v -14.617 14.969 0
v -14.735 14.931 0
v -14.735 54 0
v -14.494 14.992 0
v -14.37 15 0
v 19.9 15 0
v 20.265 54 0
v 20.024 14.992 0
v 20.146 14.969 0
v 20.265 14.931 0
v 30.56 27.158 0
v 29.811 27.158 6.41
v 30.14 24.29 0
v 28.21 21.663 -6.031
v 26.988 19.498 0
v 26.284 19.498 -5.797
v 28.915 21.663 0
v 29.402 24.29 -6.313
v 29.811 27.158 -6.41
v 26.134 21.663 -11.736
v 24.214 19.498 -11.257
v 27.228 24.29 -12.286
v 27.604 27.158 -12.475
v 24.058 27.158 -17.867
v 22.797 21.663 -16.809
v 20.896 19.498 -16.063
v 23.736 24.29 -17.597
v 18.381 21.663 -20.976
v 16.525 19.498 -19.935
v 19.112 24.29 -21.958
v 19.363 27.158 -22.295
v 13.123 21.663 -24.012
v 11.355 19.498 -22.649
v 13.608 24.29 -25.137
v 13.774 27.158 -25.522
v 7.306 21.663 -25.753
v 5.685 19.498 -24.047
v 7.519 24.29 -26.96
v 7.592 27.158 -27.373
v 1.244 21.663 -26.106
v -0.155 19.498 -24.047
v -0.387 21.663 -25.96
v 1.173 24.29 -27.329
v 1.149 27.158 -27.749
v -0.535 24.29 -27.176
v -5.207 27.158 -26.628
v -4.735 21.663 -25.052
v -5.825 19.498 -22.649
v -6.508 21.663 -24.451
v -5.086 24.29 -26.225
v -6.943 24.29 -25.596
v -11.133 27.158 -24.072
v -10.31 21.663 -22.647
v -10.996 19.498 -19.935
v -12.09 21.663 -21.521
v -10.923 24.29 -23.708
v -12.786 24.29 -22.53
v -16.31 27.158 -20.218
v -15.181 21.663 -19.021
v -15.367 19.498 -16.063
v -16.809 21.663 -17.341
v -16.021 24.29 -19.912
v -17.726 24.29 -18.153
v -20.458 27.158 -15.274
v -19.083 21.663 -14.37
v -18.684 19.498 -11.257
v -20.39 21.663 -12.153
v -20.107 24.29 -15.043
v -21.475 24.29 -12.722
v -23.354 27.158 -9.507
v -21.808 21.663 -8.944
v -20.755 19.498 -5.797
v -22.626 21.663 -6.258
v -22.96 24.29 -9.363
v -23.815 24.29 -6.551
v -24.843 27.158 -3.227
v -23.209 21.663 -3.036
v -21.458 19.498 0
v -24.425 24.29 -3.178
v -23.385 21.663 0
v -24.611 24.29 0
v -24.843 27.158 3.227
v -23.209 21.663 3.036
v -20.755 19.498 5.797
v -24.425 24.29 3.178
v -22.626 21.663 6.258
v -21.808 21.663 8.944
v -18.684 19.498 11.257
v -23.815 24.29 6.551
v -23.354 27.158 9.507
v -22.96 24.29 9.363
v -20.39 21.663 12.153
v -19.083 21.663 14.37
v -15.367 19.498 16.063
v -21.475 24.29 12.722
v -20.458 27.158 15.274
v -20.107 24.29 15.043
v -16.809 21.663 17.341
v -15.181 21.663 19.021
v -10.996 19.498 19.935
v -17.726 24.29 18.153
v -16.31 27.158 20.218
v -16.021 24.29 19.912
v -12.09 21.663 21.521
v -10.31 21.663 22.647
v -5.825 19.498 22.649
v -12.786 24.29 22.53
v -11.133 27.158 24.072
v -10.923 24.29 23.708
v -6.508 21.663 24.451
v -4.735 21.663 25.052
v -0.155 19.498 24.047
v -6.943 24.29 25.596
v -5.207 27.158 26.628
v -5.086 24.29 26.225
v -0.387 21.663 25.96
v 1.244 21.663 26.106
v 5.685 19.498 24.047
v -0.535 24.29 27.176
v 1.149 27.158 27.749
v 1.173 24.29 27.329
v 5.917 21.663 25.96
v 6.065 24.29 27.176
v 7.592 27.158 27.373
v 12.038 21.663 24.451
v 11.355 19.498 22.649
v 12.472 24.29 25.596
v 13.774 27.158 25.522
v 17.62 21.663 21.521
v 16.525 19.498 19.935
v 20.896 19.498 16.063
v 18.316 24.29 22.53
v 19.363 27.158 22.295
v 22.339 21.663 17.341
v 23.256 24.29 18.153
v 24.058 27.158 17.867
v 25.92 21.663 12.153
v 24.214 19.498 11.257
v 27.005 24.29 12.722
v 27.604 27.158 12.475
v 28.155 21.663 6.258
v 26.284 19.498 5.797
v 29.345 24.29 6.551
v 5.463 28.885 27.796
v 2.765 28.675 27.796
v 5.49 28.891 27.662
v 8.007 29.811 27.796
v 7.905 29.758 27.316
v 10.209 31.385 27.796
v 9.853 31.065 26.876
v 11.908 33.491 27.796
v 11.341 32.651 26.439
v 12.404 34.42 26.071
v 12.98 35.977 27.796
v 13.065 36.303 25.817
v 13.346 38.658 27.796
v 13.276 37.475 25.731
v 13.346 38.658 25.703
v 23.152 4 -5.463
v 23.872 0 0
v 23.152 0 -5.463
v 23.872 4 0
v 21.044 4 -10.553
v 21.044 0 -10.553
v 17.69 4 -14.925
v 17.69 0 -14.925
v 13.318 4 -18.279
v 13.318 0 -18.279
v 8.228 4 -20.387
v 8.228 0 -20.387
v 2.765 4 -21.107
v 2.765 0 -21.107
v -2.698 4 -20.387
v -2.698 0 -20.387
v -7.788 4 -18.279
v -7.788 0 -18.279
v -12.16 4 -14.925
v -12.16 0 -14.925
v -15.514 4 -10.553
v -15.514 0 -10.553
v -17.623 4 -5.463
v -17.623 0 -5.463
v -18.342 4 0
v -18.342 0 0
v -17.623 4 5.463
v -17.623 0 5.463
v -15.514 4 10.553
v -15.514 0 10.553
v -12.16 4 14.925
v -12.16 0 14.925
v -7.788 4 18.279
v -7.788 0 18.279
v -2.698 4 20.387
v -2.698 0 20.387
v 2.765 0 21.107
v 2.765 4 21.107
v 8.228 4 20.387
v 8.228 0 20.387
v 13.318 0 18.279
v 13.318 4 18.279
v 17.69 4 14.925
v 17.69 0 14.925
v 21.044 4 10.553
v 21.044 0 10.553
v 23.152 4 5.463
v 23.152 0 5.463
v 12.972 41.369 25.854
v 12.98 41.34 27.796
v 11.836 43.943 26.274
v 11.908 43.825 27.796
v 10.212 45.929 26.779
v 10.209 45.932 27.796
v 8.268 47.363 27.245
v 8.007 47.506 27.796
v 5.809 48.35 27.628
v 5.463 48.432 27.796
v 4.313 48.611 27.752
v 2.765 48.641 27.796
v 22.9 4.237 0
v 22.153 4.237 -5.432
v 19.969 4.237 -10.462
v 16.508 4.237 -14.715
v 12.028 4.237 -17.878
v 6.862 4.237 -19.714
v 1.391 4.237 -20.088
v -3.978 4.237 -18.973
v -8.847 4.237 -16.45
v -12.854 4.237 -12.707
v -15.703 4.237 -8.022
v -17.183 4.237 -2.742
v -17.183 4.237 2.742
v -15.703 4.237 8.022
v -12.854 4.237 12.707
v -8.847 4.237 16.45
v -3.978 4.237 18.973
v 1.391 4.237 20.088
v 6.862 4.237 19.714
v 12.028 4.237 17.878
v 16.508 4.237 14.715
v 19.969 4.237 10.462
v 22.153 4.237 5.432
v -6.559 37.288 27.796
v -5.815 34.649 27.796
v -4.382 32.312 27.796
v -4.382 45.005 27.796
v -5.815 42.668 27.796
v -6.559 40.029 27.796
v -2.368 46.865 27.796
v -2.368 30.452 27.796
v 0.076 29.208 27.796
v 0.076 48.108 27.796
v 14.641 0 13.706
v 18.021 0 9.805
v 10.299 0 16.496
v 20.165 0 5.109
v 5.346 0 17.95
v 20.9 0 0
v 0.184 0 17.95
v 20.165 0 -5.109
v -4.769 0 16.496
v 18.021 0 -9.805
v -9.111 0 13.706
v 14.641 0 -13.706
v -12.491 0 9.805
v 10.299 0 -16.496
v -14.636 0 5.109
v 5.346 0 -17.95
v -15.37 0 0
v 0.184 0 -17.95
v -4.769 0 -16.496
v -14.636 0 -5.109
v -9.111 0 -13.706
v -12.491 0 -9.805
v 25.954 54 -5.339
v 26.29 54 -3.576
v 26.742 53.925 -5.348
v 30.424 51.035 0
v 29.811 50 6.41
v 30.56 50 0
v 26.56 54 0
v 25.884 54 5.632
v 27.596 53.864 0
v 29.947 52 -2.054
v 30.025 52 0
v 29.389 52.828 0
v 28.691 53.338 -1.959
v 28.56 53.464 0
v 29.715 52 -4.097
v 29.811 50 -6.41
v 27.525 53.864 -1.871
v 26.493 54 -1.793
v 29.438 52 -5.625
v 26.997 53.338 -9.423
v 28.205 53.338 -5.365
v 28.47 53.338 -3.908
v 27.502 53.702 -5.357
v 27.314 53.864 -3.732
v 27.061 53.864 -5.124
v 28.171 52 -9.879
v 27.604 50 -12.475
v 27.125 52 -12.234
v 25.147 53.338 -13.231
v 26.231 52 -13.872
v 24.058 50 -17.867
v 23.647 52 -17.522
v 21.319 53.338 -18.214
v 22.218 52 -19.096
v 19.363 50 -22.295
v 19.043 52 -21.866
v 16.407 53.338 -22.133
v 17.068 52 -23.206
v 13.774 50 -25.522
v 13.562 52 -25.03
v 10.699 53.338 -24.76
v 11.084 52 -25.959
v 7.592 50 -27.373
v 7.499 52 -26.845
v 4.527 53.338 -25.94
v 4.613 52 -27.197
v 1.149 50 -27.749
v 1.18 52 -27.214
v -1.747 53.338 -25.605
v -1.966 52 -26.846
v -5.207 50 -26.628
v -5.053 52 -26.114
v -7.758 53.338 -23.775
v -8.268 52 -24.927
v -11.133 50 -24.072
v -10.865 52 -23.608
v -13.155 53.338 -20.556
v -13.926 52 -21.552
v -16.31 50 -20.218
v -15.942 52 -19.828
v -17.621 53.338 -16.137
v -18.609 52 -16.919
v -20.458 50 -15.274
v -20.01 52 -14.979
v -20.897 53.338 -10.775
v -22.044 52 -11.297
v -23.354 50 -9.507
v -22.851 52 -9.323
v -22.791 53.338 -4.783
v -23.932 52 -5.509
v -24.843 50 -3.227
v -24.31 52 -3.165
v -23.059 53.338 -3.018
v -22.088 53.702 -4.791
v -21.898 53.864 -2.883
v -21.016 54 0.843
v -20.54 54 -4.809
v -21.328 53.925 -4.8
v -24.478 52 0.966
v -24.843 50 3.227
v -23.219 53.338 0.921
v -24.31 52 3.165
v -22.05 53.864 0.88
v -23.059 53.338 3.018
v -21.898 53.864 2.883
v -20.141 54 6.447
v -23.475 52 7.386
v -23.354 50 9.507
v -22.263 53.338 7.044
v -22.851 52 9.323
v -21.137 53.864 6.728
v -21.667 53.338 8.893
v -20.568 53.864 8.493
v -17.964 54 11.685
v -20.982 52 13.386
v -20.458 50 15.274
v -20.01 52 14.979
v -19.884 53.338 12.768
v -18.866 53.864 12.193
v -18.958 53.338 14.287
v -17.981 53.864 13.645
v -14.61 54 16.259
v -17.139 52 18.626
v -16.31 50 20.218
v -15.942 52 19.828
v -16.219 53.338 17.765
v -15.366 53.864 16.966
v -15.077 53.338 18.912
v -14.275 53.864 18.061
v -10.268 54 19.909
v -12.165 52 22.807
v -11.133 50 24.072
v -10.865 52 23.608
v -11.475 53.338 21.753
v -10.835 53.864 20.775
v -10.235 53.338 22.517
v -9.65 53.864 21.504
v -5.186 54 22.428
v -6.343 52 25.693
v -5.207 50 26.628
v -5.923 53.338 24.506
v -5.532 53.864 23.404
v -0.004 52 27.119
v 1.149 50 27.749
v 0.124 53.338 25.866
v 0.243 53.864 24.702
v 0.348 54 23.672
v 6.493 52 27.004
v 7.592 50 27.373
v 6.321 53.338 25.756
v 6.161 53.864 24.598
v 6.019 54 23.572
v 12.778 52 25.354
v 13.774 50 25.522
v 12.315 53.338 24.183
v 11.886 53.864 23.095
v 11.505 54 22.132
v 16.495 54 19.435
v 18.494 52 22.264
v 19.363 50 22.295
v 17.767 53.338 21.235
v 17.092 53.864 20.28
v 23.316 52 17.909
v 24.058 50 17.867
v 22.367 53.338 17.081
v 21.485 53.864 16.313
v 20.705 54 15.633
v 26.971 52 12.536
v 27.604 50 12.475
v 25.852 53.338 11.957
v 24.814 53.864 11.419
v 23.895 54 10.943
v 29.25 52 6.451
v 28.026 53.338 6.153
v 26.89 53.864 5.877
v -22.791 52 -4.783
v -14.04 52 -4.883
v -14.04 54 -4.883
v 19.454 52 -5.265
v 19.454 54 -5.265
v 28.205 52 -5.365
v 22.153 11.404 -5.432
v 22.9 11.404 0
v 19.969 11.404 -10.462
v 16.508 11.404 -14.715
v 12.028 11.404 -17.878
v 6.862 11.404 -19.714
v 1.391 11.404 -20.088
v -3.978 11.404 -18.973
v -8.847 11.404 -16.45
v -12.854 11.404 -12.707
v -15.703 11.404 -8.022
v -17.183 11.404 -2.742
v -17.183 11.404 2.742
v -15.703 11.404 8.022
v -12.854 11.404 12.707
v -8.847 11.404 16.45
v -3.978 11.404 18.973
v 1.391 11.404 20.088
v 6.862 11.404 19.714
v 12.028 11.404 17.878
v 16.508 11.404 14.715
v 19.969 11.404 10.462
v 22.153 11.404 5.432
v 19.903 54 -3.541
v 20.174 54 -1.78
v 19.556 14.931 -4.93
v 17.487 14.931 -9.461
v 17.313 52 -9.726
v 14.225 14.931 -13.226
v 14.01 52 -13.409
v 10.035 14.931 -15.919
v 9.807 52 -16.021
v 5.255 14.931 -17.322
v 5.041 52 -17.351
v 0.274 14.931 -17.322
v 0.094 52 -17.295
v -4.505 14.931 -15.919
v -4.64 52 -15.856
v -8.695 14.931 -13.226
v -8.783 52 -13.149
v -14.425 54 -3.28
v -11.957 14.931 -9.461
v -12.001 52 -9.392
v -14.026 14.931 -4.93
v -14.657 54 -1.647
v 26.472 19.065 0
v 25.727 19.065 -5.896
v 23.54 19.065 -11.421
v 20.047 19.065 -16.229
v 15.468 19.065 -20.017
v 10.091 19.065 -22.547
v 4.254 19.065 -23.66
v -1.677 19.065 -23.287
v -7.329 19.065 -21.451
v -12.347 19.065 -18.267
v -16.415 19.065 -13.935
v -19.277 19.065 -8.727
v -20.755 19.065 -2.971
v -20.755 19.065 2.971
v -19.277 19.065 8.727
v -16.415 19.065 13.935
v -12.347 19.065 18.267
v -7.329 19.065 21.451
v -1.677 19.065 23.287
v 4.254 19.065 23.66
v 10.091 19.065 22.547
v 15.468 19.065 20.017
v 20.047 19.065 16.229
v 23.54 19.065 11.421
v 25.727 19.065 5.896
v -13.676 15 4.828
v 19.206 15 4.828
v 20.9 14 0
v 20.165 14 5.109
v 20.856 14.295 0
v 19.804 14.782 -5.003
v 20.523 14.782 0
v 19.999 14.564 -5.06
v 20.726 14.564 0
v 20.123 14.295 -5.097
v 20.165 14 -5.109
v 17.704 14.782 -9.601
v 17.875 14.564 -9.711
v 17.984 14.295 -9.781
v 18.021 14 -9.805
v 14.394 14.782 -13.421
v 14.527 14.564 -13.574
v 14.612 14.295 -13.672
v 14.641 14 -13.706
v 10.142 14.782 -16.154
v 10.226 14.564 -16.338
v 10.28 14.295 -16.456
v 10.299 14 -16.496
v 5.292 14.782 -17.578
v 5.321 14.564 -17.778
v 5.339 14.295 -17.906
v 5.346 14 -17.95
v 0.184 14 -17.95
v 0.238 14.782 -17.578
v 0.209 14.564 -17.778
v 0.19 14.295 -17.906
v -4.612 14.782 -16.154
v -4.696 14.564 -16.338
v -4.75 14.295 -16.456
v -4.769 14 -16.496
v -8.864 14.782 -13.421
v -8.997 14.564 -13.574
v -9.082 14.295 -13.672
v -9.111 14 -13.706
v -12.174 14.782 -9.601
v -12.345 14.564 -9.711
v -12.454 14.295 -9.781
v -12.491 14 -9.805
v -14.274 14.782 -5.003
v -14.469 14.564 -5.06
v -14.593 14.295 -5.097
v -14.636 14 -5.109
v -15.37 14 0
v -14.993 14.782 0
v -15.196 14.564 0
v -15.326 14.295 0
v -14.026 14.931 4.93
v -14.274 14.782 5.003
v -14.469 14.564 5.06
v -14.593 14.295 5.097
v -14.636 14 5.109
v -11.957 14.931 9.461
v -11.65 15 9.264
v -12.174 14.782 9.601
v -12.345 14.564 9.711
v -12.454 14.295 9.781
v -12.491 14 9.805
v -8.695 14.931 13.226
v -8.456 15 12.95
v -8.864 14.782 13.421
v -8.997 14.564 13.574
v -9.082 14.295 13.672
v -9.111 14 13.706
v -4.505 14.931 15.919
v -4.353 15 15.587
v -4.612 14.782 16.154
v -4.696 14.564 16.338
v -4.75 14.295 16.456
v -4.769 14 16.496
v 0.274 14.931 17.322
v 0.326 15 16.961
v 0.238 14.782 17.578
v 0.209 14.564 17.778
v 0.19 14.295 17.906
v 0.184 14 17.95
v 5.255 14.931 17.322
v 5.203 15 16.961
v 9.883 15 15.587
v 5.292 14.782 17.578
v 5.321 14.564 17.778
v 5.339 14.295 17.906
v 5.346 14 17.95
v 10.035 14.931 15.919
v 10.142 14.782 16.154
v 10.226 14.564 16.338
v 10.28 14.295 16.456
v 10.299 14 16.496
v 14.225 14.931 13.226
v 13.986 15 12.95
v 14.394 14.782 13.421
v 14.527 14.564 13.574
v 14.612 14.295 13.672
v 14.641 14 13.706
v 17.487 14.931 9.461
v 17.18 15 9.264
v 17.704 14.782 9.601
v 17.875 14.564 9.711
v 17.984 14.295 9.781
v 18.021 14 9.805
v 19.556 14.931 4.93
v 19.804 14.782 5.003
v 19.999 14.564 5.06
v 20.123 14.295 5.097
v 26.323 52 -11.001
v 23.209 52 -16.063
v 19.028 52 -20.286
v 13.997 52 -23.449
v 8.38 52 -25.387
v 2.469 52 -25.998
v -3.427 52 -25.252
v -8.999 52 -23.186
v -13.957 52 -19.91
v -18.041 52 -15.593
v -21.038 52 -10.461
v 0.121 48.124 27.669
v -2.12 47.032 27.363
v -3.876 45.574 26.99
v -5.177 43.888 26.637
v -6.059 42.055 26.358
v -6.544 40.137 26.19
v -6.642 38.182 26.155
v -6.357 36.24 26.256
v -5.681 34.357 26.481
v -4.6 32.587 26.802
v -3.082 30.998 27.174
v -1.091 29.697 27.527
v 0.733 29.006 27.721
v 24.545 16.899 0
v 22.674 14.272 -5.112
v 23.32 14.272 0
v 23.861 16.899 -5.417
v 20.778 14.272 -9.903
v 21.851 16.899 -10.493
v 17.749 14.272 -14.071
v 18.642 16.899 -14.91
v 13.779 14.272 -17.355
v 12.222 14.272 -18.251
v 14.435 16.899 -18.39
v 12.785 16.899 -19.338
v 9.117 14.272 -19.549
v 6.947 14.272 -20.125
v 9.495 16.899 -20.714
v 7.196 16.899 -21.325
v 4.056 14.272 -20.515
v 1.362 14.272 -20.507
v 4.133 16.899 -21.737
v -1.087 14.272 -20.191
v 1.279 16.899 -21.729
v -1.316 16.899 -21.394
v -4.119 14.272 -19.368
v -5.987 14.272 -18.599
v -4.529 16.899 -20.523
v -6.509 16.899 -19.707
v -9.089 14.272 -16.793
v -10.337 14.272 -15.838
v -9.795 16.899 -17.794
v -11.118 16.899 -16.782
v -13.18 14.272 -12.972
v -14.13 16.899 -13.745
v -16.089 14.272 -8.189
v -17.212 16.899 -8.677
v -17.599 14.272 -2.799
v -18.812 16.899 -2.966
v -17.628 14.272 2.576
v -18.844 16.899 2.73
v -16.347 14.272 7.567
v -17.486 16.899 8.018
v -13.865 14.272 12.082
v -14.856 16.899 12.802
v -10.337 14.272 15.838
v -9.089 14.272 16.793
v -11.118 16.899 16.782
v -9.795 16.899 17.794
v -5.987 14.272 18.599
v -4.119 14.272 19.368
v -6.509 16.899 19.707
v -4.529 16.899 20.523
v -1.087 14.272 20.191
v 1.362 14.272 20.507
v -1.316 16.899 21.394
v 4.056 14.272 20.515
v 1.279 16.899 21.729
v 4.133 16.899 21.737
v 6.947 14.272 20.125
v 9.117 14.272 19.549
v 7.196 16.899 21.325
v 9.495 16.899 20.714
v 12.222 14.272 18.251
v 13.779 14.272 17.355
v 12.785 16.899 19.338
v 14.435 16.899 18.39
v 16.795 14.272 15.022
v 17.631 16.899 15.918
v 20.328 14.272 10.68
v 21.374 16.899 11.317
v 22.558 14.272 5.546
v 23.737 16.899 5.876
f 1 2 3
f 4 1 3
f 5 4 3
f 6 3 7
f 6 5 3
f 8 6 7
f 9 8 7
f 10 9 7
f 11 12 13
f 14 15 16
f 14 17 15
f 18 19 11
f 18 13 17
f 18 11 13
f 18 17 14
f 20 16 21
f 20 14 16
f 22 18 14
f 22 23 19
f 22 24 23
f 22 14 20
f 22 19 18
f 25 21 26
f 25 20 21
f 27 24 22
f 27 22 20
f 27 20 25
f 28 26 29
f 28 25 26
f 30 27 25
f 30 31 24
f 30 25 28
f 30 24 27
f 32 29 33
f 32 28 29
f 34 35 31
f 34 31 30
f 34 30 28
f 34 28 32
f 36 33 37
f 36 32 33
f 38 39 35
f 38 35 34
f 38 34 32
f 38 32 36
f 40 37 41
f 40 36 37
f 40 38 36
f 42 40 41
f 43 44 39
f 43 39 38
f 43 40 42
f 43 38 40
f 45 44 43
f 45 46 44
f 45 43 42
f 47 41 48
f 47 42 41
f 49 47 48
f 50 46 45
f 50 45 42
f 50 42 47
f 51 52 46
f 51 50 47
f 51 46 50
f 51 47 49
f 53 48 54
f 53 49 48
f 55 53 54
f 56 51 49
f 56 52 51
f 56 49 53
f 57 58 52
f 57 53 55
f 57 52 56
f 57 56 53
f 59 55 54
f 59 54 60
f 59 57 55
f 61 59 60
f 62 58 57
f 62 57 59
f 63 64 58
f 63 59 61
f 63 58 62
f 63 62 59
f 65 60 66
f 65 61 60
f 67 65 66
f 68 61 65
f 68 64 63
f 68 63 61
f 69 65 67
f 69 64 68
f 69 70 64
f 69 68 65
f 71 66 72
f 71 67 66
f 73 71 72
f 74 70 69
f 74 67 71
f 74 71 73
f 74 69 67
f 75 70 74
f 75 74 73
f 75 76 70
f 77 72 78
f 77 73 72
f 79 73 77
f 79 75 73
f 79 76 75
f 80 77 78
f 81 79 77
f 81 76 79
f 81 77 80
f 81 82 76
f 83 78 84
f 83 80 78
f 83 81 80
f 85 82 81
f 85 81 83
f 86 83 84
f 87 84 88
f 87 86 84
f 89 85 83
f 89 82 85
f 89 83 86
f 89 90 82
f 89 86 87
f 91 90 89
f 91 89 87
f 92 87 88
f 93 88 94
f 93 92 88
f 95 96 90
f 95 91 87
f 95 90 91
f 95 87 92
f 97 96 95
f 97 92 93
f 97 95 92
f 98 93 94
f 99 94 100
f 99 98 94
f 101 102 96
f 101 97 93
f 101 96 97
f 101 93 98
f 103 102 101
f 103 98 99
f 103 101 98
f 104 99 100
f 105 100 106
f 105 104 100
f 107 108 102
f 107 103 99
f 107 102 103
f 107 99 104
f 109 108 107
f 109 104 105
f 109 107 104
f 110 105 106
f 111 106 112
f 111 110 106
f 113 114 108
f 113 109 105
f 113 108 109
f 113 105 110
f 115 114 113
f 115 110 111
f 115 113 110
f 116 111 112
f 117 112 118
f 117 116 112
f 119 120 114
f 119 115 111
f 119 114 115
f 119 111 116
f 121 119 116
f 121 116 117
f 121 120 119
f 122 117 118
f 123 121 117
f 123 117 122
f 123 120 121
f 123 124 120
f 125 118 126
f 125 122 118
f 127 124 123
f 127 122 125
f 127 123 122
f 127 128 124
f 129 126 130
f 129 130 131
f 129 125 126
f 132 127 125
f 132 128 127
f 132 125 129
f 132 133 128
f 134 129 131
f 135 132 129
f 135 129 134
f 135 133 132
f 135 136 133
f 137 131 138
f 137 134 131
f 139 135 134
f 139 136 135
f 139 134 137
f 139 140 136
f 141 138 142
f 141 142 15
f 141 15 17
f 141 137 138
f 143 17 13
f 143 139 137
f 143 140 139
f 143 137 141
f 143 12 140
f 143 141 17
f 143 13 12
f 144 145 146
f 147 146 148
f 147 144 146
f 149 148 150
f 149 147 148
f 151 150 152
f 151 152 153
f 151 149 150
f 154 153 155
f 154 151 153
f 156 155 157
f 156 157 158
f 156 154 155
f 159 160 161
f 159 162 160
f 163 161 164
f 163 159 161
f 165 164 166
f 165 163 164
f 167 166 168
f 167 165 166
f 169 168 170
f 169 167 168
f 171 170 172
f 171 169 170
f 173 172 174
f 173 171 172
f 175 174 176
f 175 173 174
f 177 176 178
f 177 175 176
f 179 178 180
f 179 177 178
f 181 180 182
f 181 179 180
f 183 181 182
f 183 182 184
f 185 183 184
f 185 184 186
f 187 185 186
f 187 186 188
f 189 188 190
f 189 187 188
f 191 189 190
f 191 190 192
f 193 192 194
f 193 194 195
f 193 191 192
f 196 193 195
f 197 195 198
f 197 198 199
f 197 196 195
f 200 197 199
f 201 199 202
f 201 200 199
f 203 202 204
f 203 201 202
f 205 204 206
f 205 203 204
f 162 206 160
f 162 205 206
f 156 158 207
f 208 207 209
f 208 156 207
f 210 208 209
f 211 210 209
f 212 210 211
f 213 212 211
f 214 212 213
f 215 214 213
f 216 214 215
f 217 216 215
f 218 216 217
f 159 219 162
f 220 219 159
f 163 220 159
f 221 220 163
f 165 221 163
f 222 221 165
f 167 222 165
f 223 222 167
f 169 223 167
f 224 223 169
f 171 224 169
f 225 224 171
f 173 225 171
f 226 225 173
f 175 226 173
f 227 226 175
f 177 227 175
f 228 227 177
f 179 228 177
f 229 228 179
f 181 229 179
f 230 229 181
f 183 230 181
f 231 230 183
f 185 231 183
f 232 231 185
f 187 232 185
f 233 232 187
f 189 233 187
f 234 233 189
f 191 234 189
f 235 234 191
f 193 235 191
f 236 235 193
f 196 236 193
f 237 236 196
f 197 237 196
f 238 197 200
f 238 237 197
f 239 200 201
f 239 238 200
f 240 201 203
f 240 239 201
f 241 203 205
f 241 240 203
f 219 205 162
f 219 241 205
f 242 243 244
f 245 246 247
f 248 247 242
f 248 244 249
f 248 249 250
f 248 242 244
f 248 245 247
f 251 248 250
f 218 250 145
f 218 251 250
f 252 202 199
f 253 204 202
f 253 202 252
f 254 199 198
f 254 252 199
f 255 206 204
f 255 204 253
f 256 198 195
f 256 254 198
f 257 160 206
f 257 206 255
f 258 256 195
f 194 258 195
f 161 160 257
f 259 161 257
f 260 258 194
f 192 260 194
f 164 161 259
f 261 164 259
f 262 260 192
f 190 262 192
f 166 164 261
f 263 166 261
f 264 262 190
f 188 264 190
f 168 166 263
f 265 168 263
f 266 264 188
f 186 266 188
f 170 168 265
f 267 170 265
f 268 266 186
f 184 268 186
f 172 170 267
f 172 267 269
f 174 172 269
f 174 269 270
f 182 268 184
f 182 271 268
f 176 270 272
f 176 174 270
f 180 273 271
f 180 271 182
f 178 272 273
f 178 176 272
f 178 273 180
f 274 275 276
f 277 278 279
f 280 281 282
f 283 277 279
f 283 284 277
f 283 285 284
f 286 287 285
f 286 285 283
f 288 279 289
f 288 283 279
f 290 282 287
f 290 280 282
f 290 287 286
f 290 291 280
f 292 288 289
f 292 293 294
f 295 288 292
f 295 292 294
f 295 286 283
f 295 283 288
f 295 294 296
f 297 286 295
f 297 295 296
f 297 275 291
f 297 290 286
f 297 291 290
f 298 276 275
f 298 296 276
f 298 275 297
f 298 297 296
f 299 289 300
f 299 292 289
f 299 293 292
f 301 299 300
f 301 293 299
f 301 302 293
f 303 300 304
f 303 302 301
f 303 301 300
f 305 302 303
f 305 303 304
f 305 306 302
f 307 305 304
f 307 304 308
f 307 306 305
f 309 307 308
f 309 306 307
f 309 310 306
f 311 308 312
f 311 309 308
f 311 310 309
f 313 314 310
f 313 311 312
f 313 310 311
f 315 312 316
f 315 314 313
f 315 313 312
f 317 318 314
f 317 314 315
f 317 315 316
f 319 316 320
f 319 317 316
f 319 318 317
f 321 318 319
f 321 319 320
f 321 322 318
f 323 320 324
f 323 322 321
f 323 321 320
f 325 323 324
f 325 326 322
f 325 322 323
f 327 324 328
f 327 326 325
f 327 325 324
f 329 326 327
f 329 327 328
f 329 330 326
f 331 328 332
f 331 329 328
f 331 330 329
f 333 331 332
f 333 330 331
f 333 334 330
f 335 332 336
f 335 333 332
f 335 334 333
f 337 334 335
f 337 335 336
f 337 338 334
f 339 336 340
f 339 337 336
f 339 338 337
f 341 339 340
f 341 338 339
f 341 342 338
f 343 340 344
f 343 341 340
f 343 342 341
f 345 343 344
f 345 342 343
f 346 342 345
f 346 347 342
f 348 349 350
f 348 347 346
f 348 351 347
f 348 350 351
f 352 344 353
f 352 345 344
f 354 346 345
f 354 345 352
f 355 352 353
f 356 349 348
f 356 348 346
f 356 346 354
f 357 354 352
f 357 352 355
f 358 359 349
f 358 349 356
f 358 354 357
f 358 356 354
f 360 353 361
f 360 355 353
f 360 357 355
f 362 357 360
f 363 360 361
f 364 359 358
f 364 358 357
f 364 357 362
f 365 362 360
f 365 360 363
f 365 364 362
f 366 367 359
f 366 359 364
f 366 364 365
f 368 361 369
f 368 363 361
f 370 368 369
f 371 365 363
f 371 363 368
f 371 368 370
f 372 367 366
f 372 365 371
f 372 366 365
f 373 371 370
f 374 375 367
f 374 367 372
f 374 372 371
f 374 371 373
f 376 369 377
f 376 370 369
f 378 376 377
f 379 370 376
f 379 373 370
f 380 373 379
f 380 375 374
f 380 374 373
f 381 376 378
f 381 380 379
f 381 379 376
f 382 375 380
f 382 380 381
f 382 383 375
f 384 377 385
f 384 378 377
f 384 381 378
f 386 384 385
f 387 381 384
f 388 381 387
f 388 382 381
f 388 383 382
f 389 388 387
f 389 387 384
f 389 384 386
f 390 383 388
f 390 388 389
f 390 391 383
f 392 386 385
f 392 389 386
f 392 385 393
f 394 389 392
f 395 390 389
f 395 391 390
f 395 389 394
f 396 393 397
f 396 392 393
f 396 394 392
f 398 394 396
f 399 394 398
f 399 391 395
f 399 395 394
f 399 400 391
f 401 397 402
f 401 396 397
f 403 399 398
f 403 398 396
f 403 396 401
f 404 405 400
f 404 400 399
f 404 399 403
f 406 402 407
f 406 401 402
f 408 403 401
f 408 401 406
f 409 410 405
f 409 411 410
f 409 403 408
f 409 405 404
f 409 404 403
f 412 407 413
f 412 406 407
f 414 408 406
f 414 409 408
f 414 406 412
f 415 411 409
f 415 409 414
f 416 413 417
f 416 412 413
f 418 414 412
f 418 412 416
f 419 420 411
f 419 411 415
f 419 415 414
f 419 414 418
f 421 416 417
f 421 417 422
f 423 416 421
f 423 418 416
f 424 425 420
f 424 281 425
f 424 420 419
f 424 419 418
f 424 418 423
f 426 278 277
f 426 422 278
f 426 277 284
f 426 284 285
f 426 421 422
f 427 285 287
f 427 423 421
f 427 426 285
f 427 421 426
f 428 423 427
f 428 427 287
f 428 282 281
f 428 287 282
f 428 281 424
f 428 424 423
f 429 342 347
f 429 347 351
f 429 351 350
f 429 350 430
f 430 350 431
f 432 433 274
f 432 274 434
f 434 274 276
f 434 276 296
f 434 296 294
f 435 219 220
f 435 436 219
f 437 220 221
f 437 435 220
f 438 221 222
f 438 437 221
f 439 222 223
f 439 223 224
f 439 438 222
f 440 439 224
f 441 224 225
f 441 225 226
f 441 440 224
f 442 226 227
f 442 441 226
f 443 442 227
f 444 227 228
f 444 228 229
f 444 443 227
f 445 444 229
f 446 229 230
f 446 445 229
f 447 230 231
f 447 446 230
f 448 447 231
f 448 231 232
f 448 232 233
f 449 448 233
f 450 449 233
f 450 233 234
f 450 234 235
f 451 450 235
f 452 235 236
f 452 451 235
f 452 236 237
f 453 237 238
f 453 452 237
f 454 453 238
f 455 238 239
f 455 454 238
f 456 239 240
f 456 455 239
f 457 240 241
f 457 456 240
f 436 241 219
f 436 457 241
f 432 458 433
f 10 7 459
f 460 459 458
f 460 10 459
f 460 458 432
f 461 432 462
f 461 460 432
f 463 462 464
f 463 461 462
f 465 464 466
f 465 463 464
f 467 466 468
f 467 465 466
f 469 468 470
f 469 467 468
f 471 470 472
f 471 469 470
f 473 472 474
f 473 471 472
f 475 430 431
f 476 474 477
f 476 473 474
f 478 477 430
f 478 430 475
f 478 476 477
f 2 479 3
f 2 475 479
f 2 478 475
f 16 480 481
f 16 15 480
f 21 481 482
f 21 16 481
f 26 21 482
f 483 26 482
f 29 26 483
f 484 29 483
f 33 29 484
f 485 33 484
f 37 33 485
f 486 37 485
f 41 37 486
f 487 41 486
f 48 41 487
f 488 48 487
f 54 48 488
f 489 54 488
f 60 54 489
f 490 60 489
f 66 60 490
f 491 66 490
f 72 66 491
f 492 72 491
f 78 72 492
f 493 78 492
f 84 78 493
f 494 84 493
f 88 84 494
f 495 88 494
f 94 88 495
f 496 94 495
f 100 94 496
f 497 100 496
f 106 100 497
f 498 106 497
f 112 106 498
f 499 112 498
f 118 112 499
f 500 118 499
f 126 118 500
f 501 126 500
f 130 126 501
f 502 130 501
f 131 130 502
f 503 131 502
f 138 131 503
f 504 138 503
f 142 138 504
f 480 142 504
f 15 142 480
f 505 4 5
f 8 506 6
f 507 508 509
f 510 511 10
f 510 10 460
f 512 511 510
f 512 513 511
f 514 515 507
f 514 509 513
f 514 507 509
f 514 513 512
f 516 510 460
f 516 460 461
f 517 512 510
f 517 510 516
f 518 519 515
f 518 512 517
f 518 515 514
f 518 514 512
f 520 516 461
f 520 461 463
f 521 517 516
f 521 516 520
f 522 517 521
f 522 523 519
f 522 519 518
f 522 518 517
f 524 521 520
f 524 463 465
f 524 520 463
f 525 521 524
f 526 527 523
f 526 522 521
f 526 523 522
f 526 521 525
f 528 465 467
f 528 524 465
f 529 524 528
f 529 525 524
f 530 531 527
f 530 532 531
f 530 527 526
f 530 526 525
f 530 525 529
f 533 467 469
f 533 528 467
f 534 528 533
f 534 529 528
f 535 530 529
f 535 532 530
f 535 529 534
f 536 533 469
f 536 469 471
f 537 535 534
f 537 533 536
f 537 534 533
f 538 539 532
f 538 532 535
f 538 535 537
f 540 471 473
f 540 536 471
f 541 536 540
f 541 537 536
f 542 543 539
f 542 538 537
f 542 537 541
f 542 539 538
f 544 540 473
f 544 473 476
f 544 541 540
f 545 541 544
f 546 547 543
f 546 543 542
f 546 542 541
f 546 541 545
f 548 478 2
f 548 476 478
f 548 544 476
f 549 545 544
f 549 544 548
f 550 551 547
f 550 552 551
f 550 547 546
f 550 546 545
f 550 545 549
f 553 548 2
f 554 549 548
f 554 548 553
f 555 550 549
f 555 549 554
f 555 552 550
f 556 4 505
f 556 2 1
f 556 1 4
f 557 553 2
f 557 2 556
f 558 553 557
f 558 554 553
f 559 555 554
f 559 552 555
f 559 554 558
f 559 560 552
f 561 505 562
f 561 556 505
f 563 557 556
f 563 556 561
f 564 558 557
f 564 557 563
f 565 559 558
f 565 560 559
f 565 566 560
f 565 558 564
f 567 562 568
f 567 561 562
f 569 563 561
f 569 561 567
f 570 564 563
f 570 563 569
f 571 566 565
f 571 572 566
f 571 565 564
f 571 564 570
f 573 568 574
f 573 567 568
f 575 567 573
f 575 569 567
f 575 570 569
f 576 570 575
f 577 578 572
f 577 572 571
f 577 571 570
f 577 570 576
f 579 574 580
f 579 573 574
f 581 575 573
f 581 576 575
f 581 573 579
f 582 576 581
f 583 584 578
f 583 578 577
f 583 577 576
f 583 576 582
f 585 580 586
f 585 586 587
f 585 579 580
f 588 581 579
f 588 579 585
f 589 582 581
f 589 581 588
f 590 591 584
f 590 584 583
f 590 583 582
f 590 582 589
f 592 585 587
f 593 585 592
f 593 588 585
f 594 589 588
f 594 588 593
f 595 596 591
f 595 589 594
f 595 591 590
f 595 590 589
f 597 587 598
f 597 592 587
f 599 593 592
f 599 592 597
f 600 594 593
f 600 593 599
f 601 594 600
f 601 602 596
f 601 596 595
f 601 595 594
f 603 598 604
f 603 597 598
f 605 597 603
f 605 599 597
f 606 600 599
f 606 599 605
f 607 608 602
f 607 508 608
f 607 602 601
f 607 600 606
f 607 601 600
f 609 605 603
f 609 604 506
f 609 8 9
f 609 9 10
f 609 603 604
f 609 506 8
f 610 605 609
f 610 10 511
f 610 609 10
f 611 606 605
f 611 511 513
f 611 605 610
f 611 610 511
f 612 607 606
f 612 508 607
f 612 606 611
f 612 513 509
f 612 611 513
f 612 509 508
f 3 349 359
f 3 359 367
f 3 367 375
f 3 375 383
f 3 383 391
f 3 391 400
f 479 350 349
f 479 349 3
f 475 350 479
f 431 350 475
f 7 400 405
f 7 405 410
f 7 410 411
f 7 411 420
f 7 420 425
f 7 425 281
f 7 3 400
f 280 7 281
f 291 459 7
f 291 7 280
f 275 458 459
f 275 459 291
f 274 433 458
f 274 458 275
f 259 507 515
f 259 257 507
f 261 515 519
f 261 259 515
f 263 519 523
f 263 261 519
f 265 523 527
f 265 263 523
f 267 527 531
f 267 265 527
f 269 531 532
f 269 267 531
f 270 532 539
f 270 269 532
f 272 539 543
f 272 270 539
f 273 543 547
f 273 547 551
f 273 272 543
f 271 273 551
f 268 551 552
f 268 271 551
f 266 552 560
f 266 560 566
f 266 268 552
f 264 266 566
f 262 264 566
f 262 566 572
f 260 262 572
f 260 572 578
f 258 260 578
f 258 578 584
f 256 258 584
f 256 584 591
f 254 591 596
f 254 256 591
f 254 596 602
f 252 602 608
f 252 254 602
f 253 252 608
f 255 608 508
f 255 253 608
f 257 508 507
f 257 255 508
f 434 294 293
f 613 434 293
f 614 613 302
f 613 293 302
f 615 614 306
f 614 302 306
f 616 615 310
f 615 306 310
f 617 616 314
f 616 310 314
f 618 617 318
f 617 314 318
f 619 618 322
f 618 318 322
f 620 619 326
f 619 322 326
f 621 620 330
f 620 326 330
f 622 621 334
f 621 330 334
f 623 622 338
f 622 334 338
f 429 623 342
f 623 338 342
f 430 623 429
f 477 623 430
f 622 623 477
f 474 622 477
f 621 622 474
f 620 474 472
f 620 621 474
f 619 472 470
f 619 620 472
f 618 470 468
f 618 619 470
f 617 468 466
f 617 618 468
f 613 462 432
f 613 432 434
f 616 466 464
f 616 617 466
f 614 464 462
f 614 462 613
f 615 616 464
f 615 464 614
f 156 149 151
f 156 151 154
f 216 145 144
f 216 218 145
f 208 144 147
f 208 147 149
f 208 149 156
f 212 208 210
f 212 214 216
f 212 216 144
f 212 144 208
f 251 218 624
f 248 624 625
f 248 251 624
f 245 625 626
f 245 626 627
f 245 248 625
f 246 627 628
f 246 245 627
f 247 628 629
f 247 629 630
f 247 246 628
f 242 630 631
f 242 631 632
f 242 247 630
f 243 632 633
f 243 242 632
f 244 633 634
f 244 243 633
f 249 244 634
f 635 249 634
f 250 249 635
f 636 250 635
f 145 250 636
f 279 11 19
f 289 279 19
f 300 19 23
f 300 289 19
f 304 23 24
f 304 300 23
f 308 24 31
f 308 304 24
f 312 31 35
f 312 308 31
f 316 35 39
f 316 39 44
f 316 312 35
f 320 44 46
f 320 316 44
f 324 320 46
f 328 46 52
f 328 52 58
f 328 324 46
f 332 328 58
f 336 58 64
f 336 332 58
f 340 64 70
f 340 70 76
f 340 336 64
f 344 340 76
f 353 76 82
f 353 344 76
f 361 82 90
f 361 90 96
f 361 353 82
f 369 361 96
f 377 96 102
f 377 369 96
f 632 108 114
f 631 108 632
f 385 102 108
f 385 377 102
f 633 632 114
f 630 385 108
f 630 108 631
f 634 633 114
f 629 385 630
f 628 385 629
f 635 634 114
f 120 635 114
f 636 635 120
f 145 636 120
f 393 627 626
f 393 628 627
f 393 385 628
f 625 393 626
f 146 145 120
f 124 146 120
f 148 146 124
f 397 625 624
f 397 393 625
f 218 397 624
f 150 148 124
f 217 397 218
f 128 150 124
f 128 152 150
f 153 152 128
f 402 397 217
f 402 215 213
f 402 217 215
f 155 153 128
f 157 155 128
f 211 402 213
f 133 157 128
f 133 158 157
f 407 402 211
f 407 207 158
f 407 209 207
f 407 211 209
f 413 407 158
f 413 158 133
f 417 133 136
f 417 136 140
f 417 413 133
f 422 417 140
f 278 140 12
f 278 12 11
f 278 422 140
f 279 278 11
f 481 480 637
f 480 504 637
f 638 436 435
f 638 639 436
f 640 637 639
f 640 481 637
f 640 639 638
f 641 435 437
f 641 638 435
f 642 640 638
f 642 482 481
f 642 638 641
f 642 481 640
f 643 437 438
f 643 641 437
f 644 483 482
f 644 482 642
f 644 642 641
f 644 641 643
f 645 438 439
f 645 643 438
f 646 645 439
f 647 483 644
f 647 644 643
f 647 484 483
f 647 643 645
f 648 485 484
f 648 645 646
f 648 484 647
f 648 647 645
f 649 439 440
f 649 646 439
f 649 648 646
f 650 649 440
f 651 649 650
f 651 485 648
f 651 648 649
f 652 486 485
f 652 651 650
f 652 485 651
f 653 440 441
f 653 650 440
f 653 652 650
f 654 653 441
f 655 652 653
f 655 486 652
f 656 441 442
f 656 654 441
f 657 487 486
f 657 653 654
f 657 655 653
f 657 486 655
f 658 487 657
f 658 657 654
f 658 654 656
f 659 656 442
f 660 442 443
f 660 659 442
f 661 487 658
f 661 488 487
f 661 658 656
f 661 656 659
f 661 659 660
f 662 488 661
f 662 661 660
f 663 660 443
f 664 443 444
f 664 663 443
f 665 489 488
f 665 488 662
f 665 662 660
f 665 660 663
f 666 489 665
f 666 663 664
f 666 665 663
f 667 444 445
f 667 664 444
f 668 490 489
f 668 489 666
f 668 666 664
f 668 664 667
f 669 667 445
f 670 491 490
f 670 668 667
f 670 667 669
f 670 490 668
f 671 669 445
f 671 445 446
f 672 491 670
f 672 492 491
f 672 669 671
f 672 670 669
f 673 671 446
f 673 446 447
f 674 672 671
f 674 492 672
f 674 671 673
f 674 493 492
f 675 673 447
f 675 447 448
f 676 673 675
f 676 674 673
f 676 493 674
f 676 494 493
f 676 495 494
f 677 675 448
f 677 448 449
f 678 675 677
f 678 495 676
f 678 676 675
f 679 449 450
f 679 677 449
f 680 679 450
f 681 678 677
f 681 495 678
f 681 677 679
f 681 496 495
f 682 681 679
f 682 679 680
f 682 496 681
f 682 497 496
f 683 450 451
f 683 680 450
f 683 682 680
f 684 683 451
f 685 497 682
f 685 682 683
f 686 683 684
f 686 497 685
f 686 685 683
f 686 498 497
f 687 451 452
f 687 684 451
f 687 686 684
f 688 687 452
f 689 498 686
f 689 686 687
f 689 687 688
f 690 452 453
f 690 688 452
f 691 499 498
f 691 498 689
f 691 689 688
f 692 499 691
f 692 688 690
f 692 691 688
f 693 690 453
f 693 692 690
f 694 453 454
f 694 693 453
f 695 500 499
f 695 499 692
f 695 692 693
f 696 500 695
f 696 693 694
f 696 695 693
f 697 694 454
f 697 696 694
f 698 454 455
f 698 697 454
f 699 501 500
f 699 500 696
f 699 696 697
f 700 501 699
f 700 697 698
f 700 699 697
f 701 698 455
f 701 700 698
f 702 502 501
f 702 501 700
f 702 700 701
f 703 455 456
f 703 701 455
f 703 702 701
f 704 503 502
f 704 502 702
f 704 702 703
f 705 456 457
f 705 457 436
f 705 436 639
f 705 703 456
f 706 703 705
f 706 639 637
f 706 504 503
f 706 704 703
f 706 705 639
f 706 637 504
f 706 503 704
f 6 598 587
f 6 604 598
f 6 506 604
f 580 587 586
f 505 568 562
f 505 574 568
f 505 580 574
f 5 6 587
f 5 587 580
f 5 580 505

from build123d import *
from build123d.topology import SkipClean

# Parameters (mm, degrees)
SKETCH10_R              = 10
BOSS_EXTRUDE1_DEPTH     = 5
CUT_EXTRUDE3_DEPTH      = 45
CUT_EXTRUDE3_DEPTH_BACK = 20
CUT_EXTRUDE5_DEPTH      = 2


with BuildPart() as part:
    # Sketch1 → Revolve1 (revolve)
    with BuildSketch(Plane.XY):
        with BuildLine():
            Line((20.9, 0), (23.871591838, 0))
            Line((23.871591838, 0), (23.871591838, 4))
            Line((23.871591838, 4), (22.9, 4.236662843))
            Line((22.9, 4.236662843), (22.9, 11.404308102))
            ThreePointArc((22.9, 11.404308102), (23.83692213, 15.63049072), (26.472123903, 19.064752533))
            Line((26.472123903, 19.064752533), (26.988320528, 19.497892931))
            ThreePointArc((26.988320528, 19.497892931), (29.623522302, 22.932154745), (30.560444431, 27.158337362))
            Line((30.560444431, 27.158337362), (30.560444431, 50))
            ThreePointArc((30.560444431, 50), (29.388871556, 52.828427125), (26.560444431, 54))
            Line((26.560444431, 54), (2.764914955, 54))
            Line((2.764914955, 54), (2.764914955, 15))
            Line((2.764914955, 15), (19.9, 15))
            ThreePointArc((19.9, 15), (20.607106781, 14.707106781), (20.9, 14))
            Line((20.9, 14), (20.9, 0))
        make_face()
    revolve(axis=Axis((2.764914955, 7.821821657, 0), (0, 1, 0)))

    # Sketch10 → Boss-Extrude1 (add)
    with SkipClean():  # the faces are left unmerged after this step: merging them gives an invalid solid
        with BuildSketch(Plane.XY.offset(27.795529476)):
            with Locations((3.346345887, 38.658337362)):
                Circle(SKETCH10_R)
        extrude(amount=-BOSS_EXTRUDE1_DEPTH)

    # Sketch11 → Cut-Extrude3 (cut, two sides: drawn at the far end of the back side and taken through both)
    with SkipClean():  # the faces are left unmerged after this step: merging them gives an invalid solid
        with BuildSketch(Plane(origin=(0, 17, 0), x_dir=(1, 0, 0), z_dir=(0, 1, 0)).offset(-CUT_EXTRUDE3_DEPTH_BACK)):
            with BuildLine():
                Line((-14.735085045, 0), (20.264914955, 0))
                ThreePointArc((20.264914955, 0), (2.764914955, 17.5), (-14.735085045, 0))
            make_face()
        extrude(amount=CUT_EXTRUDE3_DEPTH + CUT_EXTRUDE3_DEPTH_BACK, mode=Mode.SUBTRACT)

    # Sketch9 → Cut-Extrude5 (cut)
    with SkipClean():  # the faces are left unmerged after this step: merging them gives an invalid solid
        with BuildSketch(Plane(origin=(0, 54, 0), x_dir=(1, 0, 0), z_dir=(0, 1, 0))):
            with BuildLine():
                Line((-22.791277346, 4.78341249), (28.205408486, 5.364819562))
                ThreePointArc((28.205408486, 5.364819562), (2.46851135, 25.998310424), (-22.791277346, 4.78341249))
            make_face()
        extrude(amount=-CUT_EXTRUDE5_DEPTH, mode=Mode.SUBTRACT)


solid = part.part
